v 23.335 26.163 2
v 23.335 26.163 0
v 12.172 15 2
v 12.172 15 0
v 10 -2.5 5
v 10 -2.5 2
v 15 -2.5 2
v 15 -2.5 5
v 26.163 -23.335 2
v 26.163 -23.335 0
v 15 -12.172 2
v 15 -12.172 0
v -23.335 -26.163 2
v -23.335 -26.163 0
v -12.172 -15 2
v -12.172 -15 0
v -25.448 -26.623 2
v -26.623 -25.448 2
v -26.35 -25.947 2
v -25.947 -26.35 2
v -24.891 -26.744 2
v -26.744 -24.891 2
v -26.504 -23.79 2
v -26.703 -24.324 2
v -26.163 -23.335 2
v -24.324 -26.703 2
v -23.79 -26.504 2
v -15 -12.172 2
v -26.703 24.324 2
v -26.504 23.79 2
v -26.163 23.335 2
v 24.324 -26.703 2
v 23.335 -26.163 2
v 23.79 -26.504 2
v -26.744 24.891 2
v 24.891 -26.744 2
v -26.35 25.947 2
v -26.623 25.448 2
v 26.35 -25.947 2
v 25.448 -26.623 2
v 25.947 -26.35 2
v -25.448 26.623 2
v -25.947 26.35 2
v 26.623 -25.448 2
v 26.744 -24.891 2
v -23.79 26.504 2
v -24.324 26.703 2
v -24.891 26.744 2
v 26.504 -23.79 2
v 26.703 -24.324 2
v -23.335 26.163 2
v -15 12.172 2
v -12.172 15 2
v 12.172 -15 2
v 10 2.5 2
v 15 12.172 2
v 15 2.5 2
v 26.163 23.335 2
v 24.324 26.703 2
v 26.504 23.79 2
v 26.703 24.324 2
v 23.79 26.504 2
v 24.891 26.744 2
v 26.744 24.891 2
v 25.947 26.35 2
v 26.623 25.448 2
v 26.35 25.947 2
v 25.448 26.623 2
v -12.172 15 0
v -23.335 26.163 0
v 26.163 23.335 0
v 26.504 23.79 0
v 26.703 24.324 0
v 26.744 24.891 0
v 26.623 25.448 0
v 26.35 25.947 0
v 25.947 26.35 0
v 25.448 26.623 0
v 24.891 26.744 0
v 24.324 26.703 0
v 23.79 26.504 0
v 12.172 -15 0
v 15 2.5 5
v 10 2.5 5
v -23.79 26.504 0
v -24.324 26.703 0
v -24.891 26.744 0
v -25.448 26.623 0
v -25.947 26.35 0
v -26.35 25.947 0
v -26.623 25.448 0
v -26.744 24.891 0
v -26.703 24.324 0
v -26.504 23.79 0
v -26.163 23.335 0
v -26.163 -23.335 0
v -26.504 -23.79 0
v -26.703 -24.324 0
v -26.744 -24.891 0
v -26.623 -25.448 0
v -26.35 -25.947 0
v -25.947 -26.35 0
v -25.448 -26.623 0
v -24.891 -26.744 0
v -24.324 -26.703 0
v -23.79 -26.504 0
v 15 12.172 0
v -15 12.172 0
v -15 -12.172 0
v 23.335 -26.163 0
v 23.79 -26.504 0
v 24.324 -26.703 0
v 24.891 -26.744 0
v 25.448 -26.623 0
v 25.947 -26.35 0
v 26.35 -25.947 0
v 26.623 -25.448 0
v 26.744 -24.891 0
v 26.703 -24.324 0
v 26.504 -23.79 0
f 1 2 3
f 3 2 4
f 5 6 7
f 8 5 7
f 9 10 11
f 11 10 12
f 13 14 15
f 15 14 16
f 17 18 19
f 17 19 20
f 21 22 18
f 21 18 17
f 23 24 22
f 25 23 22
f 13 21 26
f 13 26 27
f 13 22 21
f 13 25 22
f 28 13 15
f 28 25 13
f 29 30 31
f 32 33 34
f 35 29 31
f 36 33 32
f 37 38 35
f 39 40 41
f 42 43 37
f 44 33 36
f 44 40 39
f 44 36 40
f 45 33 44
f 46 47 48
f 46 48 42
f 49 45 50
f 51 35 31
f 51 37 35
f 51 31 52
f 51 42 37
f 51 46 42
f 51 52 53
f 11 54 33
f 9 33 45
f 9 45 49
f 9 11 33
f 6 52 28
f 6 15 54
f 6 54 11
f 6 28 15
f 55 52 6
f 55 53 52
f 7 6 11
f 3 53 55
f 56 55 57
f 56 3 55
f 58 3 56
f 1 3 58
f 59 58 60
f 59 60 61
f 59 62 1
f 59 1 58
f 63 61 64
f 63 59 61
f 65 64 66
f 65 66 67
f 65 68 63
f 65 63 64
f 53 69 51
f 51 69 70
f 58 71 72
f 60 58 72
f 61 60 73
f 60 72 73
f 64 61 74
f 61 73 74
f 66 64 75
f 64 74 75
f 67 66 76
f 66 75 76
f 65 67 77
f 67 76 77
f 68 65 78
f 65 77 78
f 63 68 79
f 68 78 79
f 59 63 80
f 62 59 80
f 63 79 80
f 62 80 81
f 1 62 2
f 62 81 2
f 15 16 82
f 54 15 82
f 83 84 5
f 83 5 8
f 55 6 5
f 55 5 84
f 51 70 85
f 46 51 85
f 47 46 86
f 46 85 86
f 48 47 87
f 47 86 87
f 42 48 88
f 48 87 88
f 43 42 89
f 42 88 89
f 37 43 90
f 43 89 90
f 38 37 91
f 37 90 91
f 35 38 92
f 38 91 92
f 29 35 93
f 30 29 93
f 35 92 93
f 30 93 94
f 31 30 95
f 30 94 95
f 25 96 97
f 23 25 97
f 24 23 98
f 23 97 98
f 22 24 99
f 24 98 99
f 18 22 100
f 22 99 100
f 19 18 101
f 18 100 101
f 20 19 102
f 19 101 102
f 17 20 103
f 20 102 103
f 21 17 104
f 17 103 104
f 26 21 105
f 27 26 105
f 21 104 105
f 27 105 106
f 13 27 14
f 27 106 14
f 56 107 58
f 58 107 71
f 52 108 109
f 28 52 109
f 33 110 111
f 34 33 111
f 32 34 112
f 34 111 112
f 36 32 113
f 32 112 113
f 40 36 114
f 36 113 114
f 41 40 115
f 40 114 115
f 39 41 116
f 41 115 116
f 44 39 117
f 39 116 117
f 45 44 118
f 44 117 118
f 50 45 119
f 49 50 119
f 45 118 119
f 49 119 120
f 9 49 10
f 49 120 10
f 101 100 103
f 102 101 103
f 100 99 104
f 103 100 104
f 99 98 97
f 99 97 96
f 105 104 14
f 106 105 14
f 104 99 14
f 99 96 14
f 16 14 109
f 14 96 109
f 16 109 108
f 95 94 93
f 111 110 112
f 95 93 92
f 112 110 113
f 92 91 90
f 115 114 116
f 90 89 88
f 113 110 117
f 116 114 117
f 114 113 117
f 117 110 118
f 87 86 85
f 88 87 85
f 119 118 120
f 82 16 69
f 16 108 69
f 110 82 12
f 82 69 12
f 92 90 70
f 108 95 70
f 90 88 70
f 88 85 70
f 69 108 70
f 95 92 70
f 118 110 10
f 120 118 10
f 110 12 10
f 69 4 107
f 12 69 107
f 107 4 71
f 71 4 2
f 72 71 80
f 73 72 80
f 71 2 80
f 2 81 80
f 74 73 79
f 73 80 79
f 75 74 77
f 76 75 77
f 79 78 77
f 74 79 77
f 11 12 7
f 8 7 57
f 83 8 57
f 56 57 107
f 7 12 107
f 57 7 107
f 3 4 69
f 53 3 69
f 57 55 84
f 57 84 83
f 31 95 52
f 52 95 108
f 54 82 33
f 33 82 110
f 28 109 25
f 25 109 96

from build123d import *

# Parameters (mm, degrees)
F1_DEPTH = 2
F2_W     = 5
F2_H     = 5
F3_DEPTH = 3


with BuildPart() as f1:
    # F0 (on Top) → F1 (new body)
    with BuildSketch(Plane.XY):
        with BuildLine():
            Line((12.171573, 15), (-12.171573, 15))
            Line((-12.171573, 15), (-23.334524, 26.162951))
            ThreePointArc((-23.334524, 26.162951), (-26.162951, 26.162951), (-26.162951, 23.334524))
            Line((-26.162951, 23.334524), (-15, 12.171573))
            Line((-15, 12.171573), (-15, -12.171573))
            Line((-15, -12.171573), (-26.162951, -23.334524))
            ThreePointArc((-26.162951, -23.334524), (-26.162951, -26.162951), (-23.334524, -26.162951))
            Line((-23.334524, -26.162951), (-12.171573, -15))
            Line((-12.171573, -15), (12.171573, -15))
            Line((12.171573, -15), (23.334524, -26.162951))
            ThreePointArc((23.334524, -26.162951), (26.162951, -26.162951), (26.162951, -23.334524))
            Line((26.162951, -23.334524), (15, -12.171573))
            Line((15, -12.171573), (15, 12.171573))
            Line((15, 12.171573), (26.162951, 23.334524))
            ThreePointArc((26.162951, 23.334524), (26.162951, 26.162951), (23.334524, 26.162951))
            Line((23.334524, 26.162951), (12.171573, 15))
        make_face()
    extrude(amount=F1_DEPTH)

    # F2 (on face) → F3 (join)
    with BuildSketch(Plane.XY.offset(2)):
        with Locations((12.5, 0)):
            Rectangle(F2_W, F2_H)
    extrude(amount=F3_DEPTH)


solid = f1.part
